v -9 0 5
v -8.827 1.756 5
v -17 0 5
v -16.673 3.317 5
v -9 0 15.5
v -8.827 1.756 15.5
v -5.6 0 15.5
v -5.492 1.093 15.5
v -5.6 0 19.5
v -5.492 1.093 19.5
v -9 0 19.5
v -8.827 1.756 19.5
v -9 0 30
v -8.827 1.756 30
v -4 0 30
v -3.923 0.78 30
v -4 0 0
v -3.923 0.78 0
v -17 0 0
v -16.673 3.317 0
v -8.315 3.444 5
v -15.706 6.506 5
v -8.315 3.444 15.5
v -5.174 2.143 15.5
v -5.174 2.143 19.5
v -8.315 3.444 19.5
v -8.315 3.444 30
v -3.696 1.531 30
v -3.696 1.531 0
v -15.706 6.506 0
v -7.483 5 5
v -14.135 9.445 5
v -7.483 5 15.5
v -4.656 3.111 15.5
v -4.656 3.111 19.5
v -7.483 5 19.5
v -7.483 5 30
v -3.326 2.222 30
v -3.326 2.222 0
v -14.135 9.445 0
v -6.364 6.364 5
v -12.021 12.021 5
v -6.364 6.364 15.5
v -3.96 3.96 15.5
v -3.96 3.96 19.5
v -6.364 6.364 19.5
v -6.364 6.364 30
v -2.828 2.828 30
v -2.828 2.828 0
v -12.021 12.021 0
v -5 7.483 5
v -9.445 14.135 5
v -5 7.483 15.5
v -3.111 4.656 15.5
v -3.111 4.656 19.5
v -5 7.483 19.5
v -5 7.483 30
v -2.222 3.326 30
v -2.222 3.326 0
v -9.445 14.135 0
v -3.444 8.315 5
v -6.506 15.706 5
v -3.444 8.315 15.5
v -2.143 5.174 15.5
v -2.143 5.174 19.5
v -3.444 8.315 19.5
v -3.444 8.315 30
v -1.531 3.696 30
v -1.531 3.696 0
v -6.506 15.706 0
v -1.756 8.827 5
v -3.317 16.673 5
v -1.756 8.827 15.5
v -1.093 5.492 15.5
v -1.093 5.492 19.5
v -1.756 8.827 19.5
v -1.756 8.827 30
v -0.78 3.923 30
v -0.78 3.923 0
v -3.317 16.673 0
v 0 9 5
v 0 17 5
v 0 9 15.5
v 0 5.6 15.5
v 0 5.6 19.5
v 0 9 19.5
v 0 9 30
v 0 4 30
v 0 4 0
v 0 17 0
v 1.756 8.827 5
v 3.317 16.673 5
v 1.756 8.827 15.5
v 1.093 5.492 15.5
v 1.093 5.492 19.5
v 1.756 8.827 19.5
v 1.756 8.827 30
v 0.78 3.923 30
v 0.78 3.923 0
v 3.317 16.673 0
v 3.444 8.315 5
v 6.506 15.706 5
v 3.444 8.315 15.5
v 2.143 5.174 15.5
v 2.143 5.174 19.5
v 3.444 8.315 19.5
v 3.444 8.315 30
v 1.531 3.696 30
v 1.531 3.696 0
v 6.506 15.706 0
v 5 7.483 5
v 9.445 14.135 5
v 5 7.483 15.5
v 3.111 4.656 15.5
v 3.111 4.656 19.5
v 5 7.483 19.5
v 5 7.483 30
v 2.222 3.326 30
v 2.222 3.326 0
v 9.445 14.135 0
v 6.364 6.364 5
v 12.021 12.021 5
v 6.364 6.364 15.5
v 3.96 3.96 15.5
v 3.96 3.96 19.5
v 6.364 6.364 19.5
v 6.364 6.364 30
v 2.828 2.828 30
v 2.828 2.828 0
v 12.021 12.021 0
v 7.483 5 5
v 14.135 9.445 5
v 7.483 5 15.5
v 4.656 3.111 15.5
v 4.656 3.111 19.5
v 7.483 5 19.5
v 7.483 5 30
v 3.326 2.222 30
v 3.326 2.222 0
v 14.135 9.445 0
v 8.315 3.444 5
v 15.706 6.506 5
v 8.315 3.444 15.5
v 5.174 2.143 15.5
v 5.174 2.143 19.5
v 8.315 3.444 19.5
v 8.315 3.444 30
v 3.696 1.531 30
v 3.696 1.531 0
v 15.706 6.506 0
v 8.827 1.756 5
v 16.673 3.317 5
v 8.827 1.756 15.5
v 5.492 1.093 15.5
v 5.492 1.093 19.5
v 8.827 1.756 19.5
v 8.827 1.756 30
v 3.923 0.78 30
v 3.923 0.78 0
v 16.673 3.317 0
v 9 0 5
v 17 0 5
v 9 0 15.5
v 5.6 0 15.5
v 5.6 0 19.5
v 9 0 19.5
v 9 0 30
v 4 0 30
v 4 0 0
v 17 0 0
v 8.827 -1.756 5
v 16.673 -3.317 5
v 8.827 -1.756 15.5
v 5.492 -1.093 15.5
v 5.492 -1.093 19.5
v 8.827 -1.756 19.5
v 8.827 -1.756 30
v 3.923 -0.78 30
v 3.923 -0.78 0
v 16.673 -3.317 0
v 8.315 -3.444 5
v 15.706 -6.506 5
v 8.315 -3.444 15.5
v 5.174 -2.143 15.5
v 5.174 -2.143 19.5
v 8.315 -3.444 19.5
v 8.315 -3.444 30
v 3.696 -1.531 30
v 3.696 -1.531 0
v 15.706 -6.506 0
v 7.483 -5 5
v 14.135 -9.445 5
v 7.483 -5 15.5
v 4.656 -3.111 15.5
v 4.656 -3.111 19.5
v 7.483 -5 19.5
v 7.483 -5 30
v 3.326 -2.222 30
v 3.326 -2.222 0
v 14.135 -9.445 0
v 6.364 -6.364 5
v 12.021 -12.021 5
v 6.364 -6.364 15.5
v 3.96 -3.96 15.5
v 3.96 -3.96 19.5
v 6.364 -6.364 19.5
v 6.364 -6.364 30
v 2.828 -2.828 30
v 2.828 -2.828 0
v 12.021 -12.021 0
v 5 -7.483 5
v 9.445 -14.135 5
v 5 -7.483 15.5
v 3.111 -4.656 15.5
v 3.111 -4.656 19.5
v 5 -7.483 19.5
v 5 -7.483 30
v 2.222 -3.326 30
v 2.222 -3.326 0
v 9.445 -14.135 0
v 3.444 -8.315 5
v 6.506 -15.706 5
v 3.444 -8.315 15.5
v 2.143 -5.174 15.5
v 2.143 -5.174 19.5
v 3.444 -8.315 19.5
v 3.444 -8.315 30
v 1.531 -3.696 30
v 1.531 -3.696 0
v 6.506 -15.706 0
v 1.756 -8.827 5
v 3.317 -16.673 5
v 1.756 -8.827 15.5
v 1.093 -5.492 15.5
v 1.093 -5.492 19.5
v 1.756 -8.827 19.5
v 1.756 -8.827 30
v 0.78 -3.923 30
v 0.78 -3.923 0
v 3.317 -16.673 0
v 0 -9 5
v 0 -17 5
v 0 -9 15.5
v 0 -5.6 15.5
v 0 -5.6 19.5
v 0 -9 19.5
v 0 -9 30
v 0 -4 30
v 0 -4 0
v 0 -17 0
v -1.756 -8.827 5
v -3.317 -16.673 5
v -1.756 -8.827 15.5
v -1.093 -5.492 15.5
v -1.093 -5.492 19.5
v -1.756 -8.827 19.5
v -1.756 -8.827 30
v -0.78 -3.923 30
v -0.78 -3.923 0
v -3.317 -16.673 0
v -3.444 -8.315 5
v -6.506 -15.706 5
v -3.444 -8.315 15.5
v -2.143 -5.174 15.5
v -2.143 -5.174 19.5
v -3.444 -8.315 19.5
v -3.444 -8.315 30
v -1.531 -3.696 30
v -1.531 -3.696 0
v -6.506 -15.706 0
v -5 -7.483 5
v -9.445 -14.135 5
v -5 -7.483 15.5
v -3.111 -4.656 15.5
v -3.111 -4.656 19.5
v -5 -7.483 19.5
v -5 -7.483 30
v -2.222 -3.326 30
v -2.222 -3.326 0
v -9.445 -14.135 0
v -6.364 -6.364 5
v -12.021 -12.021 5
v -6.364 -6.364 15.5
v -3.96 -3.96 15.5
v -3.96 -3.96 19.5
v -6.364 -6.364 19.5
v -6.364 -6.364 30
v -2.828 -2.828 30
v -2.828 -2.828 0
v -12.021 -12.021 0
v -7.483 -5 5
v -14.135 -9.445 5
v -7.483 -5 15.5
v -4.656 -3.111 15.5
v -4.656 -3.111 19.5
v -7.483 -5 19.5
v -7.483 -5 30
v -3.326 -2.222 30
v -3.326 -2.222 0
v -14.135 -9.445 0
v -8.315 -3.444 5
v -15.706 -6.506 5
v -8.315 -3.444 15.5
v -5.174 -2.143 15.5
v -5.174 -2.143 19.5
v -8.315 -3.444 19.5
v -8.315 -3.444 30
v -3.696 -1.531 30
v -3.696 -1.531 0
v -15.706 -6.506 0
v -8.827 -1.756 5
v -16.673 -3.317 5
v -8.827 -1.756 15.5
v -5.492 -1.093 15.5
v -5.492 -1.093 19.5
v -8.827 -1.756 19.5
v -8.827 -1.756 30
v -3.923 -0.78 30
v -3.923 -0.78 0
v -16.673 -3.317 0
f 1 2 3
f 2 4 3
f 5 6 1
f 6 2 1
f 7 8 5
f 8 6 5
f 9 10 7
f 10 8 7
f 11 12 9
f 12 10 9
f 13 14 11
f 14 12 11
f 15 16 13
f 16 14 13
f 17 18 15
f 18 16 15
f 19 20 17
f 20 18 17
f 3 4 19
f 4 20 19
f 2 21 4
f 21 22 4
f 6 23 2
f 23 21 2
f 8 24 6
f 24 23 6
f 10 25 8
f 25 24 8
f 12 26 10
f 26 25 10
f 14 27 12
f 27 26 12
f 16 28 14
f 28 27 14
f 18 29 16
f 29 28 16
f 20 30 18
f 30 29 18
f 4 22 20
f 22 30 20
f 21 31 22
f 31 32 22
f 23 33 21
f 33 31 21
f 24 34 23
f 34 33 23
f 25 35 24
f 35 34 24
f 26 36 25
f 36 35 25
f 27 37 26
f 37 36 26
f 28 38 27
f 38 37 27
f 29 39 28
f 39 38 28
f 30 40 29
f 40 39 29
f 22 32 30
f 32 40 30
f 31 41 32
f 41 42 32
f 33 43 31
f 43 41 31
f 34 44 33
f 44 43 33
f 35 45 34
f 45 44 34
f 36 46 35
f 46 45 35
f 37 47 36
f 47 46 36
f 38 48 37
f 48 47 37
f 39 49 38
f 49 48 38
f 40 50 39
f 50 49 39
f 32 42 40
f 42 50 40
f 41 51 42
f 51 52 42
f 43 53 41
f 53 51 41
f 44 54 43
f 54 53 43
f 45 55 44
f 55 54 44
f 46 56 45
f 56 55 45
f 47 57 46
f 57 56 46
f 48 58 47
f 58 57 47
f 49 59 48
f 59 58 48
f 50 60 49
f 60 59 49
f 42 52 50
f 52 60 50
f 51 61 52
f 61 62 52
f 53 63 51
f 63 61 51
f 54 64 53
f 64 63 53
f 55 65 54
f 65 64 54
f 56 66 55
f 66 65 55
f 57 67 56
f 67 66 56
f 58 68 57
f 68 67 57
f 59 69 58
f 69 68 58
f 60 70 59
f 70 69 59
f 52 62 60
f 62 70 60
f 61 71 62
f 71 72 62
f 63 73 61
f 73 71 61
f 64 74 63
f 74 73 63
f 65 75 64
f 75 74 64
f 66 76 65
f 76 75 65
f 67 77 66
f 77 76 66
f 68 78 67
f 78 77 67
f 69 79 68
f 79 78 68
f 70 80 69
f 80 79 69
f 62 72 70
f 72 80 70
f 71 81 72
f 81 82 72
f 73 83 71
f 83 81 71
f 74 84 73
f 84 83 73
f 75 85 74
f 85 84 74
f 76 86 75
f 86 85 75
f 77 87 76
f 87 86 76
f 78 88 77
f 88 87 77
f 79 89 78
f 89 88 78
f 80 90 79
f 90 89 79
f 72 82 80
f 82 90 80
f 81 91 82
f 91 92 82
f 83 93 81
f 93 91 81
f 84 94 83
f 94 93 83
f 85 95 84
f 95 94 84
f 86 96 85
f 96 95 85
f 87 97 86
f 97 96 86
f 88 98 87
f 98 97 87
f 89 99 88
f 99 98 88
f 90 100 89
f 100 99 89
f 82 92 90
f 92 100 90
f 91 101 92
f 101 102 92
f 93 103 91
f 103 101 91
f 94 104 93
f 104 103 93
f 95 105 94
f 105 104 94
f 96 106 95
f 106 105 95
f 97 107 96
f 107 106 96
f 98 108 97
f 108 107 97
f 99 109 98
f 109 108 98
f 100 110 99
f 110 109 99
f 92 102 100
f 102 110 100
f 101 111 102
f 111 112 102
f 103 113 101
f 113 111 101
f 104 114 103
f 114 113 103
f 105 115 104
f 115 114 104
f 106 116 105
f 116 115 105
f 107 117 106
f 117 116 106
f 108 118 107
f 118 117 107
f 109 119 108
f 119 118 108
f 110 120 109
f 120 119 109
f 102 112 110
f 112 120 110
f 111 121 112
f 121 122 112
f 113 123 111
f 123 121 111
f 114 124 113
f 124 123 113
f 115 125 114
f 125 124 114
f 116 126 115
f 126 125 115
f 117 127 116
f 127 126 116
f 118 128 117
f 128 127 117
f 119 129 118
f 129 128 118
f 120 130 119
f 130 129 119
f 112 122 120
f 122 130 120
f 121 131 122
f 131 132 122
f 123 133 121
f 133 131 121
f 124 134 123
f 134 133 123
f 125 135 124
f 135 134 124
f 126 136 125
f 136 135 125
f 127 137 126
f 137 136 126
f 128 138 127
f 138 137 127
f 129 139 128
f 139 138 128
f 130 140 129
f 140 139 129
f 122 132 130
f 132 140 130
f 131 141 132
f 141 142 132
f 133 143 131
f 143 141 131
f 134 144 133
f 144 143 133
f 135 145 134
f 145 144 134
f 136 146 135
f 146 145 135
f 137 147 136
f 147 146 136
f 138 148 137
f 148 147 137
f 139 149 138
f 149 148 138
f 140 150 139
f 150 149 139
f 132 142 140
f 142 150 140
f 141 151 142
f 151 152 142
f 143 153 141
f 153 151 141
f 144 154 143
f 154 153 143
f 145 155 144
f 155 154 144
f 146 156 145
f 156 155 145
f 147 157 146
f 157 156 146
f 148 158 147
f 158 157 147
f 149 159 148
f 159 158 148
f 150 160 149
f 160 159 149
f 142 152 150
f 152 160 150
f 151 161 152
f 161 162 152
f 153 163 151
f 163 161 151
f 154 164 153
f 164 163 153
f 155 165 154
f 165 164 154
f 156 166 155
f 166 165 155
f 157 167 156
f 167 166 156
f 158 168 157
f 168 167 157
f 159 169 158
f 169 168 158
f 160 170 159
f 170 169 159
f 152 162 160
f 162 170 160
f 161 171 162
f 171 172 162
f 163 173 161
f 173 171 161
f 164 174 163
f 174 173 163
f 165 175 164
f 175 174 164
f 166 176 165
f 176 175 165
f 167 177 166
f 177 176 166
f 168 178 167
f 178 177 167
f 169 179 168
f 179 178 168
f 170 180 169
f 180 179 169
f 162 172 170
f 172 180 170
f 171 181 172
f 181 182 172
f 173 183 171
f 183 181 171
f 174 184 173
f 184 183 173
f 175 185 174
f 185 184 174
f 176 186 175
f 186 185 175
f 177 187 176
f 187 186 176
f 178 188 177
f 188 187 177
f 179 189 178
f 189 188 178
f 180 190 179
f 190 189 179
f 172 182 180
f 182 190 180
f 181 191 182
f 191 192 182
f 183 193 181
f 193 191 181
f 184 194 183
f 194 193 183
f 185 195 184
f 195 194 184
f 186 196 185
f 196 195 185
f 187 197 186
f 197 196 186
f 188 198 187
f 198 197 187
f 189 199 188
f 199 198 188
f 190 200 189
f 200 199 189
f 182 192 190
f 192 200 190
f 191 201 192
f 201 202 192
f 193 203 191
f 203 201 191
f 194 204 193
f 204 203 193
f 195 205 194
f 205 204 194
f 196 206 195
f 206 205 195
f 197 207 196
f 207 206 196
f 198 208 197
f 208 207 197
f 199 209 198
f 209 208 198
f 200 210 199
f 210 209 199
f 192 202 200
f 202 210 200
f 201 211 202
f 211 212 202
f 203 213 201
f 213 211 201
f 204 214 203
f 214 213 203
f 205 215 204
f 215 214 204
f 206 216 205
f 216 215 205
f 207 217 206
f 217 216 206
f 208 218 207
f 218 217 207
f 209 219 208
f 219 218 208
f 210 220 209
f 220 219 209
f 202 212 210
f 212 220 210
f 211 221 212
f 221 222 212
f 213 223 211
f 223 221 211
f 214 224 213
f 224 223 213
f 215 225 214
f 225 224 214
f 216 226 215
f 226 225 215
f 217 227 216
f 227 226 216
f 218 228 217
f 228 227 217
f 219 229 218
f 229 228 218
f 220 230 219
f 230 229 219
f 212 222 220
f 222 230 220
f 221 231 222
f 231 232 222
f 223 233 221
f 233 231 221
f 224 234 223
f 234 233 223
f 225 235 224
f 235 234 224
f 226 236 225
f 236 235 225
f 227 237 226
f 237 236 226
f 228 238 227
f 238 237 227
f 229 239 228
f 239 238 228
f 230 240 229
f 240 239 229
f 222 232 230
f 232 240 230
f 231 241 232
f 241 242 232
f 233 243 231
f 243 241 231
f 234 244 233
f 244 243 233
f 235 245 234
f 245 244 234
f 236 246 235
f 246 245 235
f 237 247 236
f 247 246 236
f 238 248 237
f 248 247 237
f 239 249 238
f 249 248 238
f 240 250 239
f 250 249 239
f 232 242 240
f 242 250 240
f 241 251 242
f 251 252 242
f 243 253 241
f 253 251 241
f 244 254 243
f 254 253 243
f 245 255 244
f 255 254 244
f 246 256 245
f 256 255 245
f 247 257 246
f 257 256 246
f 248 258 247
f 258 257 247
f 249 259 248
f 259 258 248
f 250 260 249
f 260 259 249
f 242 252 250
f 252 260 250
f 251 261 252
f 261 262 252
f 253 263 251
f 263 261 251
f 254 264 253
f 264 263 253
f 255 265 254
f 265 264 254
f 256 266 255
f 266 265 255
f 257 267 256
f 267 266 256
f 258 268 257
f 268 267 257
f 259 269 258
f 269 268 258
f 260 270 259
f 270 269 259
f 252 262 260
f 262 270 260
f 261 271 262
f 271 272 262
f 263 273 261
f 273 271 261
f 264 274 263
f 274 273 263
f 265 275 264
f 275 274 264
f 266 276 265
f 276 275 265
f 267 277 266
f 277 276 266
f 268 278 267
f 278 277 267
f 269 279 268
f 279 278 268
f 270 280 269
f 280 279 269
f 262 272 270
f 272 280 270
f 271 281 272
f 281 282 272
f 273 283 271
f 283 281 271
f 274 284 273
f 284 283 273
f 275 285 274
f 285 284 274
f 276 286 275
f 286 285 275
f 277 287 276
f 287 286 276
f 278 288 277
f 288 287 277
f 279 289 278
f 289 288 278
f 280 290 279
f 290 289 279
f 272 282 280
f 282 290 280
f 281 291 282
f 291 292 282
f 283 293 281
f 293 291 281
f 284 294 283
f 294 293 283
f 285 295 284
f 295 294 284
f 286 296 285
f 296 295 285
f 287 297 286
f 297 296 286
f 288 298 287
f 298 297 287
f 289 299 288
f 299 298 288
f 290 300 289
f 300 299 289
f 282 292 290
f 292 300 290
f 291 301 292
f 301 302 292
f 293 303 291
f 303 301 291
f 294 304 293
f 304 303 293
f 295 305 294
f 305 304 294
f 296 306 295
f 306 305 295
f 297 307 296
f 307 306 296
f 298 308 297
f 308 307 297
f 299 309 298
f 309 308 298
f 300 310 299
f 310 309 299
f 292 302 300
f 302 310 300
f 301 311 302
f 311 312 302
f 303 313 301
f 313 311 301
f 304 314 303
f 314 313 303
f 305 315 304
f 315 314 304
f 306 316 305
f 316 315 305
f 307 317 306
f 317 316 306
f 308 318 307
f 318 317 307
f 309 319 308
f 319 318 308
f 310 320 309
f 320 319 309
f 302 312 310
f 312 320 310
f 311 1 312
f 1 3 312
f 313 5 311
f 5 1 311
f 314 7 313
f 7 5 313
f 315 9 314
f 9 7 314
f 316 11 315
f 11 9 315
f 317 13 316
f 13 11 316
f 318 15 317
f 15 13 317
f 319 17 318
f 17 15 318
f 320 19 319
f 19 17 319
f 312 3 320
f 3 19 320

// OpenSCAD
$fn = 32;

// ----------------------------------------------------------------------
// Grooved revolve: flanged, bore R4
// ----------------------------------------------------------------------

// --- parameters (mm) ---
bore_r = 4;               // bore radius
outer_r = 9;              // outer radius of the body
total_h = 30;             // overall height, Z
wall = 5;                 // radial wall thickness
groove_w = 4;             // groove width
groove_d = 3.4;           // groove depth
grooves = 1;              // number of outer grooves
flange_r = 17;            // flange radius
flange_h = 5;             // flange height

bbox_x = 2 * flange_r;  // full diameter
bore_d = 2 * bore_r;  // bore diameter
body_d = 2 * outer_r;  // body diameter
flange_d = 2 * flange_r;  // flange diameter
revolve_angle = 360;  // full turn around the Z axis

profile = [[4, 0], [9, 0], [17, 0], [17, 5], [9, 5], [9, 15.5], [5.6, 15.5], [5.6, 19.5], [9, 19.5], [9, 30], [4, 30]];  // primary outline, 11 points, counter clockwise

// --- the one profile operation ---
rotate_extrude(angle = revolve_angle) polygon(points = profile);
